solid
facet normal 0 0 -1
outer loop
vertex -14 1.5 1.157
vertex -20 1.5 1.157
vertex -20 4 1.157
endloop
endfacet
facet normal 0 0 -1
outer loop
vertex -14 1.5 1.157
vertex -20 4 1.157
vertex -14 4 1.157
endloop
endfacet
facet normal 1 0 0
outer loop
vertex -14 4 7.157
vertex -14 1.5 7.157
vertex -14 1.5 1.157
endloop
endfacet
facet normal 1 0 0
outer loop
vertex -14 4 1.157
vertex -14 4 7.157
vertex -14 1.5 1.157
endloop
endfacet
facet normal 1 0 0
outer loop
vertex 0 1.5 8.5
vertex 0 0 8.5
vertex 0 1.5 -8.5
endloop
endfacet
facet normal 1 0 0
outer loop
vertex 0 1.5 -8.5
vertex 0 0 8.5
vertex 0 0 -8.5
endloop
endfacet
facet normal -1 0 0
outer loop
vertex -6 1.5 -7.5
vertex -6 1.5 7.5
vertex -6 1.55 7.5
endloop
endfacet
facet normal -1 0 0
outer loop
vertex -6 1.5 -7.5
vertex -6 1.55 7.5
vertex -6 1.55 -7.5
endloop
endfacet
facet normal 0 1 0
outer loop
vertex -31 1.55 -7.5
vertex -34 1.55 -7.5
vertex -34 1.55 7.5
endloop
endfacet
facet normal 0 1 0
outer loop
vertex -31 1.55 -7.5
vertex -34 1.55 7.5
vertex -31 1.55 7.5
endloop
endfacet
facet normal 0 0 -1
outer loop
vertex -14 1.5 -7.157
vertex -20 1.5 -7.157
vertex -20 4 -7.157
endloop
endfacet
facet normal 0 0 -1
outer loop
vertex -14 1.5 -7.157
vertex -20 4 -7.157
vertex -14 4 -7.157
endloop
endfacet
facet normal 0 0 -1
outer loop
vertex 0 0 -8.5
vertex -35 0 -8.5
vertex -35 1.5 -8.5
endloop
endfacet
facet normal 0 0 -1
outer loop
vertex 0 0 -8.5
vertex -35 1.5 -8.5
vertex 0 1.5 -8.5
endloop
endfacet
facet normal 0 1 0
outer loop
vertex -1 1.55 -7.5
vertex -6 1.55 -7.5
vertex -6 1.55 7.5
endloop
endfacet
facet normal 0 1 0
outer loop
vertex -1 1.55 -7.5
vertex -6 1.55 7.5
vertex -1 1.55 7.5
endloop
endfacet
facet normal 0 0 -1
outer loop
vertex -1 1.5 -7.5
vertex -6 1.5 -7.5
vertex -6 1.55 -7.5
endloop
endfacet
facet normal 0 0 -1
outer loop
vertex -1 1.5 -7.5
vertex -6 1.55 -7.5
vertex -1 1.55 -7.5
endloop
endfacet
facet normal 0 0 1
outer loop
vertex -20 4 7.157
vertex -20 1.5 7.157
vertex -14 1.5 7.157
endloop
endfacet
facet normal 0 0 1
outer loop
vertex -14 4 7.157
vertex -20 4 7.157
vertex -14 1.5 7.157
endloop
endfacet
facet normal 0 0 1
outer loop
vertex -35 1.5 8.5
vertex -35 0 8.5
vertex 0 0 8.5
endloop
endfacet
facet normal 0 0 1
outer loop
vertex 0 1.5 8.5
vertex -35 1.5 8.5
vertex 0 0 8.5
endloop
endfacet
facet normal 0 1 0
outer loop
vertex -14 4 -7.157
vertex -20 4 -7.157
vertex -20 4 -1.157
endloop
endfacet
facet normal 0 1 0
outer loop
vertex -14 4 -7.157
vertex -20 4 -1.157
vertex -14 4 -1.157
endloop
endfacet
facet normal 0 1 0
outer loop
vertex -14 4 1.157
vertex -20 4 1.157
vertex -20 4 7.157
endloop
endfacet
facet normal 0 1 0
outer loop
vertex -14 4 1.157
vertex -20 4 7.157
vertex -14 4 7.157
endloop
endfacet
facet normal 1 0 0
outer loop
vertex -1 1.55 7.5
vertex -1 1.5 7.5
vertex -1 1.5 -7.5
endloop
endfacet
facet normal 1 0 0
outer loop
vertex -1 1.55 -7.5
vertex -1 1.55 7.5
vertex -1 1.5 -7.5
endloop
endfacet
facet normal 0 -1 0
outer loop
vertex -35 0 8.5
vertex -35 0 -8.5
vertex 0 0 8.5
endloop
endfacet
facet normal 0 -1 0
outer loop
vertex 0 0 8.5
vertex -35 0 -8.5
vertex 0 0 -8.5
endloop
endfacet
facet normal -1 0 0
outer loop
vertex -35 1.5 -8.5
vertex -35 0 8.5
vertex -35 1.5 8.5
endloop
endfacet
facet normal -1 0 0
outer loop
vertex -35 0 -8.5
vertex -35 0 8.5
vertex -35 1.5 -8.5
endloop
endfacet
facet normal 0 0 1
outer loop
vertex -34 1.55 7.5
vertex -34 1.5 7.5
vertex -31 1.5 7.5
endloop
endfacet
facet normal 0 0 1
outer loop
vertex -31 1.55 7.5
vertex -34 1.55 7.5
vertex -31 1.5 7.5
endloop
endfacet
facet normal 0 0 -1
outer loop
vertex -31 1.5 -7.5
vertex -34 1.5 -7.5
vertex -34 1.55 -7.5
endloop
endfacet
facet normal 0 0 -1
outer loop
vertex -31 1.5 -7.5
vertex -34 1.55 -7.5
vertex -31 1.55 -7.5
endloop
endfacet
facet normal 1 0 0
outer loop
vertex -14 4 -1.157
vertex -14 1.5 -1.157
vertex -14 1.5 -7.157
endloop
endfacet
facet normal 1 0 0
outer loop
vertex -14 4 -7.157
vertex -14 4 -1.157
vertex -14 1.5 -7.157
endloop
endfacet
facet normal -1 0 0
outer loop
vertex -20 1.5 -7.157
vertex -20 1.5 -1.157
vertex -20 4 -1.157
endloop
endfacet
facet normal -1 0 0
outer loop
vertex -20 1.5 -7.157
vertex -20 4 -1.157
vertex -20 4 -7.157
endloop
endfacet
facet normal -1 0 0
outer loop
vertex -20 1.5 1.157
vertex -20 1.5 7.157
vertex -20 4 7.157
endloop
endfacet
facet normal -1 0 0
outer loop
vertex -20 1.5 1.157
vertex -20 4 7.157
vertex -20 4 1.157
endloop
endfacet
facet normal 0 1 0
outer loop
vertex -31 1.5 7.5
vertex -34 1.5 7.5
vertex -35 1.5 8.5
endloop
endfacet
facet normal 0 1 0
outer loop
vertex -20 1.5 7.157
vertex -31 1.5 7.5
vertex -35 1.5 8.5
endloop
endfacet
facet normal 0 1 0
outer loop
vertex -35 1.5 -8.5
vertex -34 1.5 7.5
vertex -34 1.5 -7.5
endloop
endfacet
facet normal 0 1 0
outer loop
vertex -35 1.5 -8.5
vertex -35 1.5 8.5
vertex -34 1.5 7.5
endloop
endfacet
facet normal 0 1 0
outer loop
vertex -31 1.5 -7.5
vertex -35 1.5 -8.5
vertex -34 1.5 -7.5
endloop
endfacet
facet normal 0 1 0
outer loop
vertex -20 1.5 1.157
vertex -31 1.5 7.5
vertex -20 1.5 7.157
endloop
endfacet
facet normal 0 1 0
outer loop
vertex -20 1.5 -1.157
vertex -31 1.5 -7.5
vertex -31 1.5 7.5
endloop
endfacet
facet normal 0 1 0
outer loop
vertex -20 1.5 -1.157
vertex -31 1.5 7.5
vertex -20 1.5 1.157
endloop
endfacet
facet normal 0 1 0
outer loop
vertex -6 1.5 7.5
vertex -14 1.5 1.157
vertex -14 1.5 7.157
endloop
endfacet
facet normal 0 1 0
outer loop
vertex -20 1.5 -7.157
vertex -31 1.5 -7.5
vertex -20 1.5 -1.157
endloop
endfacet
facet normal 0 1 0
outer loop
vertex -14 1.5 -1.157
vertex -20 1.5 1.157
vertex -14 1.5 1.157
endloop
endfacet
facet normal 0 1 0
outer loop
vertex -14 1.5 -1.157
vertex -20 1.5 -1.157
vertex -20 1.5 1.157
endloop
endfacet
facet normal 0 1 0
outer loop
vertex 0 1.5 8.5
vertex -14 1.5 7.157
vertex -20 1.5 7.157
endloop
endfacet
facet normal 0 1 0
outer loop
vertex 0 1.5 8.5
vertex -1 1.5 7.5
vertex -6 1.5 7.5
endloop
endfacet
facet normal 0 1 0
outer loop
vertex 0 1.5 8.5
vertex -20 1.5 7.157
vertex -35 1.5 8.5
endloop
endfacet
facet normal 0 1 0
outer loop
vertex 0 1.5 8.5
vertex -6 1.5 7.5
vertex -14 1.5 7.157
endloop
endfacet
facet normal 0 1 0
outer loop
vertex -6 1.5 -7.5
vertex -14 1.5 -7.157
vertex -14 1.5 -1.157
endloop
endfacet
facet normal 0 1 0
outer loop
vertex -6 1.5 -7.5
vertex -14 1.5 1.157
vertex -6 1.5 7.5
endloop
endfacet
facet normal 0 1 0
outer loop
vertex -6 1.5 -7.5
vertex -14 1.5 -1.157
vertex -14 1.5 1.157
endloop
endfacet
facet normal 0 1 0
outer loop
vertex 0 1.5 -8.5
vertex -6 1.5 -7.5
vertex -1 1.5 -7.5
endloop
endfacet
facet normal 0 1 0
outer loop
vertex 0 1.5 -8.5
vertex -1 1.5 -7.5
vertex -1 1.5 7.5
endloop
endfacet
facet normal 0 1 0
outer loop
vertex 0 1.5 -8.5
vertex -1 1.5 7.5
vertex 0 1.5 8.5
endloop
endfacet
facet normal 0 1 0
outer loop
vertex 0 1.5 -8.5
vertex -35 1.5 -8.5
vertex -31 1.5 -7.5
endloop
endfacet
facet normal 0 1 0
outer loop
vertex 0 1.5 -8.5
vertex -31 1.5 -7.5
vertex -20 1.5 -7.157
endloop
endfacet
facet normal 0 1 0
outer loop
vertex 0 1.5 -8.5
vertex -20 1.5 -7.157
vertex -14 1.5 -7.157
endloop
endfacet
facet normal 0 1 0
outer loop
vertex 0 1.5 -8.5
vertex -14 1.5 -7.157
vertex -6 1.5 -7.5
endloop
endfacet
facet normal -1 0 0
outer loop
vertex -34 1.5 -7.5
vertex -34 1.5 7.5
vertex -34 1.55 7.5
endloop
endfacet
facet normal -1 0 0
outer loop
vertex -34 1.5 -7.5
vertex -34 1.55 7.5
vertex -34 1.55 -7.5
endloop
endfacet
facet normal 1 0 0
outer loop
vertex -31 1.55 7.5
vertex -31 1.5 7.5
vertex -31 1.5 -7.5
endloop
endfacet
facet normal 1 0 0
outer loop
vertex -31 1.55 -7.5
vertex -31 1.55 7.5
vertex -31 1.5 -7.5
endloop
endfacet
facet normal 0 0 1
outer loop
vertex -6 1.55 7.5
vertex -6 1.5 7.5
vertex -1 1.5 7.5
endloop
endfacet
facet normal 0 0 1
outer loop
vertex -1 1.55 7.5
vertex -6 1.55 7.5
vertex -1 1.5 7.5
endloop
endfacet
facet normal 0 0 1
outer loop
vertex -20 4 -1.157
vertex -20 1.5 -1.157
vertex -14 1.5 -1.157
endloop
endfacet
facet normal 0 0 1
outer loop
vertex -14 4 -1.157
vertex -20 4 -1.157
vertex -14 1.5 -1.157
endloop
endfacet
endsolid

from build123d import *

# Parameters (mm, degrees)
SKETCH_1_W      = 35
SKETCH_1_H      = 17
EXTRUDE_1_DEPTH = 1.5
SKETCH_4_W      = 6
SKETCH_4_H      = 6
EXTRUDE_3_DEPTH = 4
SKETCH_6_W      = 5
SKETCH_6_H      = 15
SKETCH_6_W_2    = 3
EXTRUDE_4_DEPTH = 1.55


with BuildPart() as part:
    # Эскиз1 → Бобышка-Вытянуть1 (new body)
    with BuildSketch(Plane(origin=(0, 0, 0), x_dir=(1, 0, 0), z_dir=(0, 1, 0))):
        with Locations((-17.5, 0)):
            Rectangle(SKETCH_1_W, SKETCH_1_H)
    extrude(amount=EXTRUDE_1_DEPTH)

    # Эскиз4 → Бобышка-Вытянуть3 (add)
    with BuildSketch(Plane(origin=(0, 0, 0), x_dir=(1, 0, 0), z_dir=(0, 1, 0))):
        with Locations((-17, 4.156615609)):
            Rectangle(SKETCH_4_W, SKETCH_4_H)
        with Locations((-17, -4.156615609)):
            Rectangle(SKETCH_4_W, SKETCH_4_H)
    extrude(amount=EXTRUDE_3_DEPTH)

    # Эскиз6 → Бобышка-Вытянуть4 (add)
    with BuildSketch(Plane(origin=(0, 0, 0), x_dir=(1, 0, 0), z_dir=(0, 1, 0))):
        with Locations((-3.5, 0)):
            Rectangle(SKETCH_6_W, SKETCH_6_H)
        with Locations((-32.5, 0)):
            Rectangle(SKETCH_6_W_2, SKETCH_6_H)
    extrude(amount=EXTRUDE_4_DEPTH)


solid = part.part
